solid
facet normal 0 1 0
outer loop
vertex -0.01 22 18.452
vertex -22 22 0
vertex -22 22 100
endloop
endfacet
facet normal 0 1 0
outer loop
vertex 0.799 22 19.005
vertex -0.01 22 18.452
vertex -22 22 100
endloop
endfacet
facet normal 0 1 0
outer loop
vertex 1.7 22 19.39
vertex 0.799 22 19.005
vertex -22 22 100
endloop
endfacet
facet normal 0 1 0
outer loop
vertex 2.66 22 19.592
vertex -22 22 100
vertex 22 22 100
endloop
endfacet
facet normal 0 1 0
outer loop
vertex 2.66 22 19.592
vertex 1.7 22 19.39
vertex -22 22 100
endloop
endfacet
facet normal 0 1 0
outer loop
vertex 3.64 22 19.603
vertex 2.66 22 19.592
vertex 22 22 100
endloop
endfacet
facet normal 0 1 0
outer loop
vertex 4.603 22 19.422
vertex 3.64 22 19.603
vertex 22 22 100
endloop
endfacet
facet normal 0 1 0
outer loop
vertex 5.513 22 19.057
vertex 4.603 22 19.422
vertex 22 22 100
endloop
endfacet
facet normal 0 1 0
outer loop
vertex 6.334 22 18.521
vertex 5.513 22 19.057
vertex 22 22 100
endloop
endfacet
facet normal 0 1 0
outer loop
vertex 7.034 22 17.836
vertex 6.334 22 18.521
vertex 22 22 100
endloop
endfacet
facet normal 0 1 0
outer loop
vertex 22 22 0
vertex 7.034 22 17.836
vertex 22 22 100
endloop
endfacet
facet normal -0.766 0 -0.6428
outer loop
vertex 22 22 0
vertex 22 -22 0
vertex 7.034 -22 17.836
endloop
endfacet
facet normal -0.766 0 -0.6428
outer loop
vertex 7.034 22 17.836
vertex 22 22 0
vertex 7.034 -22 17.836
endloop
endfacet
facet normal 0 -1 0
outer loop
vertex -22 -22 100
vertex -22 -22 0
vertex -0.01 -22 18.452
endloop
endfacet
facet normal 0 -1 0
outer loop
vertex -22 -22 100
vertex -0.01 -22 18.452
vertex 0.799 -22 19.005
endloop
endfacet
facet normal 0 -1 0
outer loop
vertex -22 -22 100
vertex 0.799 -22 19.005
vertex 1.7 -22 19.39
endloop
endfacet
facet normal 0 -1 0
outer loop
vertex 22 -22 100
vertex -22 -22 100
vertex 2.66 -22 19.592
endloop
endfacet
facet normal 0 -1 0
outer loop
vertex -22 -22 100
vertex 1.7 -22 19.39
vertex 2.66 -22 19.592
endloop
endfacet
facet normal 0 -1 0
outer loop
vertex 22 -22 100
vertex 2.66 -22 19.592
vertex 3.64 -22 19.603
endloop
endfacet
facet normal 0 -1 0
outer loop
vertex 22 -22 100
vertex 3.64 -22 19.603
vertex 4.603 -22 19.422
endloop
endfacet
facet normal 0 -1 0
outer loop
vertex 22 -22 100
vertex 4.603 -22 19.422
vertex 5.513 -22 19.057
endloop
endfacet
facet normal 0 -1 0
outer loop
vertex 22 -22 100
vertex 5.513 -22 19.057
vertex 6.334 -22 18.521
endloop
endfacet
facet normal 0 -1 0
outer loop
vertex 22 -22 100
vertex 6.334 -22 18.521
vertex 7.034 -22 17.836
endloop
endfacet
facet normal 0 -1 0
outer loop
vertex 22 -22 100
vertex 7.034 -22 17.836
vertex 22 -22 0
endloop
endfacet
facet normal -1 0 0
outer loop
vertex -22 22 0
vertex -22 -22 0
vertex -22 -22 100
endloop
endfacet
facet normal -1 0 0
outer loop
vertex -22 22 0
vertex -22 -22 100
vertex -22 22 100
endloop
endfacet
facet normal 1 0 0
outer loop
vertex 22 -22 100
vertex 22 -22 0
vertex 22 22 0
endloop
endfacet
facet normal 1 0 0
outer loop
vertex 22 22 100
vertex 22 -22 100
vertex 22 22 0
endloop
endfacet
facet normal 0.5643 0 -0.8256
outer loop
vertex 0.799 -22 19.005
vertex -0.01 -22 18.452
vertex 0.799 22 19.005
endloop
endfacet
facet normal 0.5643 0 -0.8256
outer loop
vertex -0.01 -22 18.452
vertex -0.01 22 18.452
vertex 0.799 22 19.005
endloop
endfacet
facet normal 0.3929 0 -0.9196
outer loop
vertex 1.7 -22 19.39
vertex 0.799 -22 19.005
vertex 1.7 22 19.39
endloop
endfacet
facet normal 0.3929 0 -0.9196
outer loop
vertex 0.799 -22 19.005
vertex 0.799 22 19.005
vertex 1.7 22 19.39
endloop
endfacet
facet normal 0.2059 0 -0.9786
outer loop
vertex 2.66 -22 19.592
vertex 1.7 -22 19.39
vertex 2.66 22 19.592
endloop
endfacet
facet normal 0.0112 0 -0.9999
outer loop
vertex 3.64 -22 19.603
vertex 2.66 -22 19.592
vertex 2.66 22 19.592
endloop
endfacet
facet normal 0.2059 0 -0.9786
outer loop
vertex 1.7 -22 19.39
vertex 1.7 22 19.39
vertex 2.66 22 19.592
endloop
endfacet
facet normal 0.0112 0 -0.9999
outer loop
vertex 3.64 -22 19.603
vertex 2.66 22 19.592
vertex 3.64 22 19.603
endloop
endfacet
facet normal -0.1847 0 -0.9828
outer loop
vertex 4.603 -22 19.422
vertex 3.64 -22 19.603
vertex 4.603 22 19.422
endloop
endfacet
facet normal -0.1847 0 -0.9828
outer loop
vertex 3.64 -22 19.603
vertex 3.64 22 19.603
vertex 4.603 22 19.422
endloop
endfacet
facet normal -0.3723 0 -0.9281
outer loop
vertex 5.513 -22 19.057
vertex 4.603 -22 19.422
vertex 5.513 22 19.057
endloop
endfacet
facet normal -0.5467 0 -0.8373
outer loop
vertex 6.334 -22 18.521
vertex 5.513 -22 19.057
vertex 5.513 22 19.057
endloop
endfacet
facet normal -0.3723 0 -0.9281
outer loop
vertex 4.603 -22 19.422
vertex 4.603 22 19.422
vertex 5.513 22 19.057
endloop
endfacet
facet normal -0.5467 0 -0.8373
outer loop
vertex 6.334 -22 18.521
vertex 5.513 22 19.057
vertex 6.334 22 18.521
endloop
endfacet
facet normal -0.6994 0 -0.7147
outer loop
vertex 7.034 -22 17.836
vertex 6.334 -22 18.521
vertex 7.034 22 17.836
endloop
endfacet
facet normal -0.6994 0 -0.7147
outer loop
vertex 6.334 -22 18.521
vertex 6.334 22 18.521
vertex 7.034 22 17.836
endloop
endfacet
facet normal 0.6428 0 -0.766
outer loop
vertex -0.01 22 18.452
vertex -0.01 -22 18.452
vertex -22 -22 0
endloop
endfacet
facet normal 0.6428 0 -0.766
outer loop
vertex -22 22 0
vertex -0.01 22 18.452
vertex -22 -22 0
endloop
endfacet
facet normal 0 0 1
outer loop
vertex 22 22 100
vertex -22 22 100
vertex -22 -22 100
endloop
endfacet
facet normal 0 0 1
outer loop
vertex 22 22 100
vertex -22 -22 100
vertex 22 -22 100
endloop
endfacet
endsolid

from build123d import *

# Parameters (mm, degrees)
F0_W     = 44
F0_H     = 44
F1_DEPTH = 100
F3_DEPTH = 44.001
F4_R     = 5


with BuildPart() as f1:
    # F0 (on Top) → F1 (new body)
    with BuildSketch(Plane.XY):
        Rectangle(F0_W, F0_H)
    extrude(amount=F1_DEPTH)

    # F2 (on face) → F3 (cut, through all)
    with BuildSketch(Plane.XZ.offset(22)):
        Polygon((3.82026, 21.665771), (-22, 0), (22, 0), align=None)
    extrude(amount=-F3_DEPTH, mode=Mode.SUBTRACT)

    # F4
    f4_edges = [f1.edges().sort_by_distance(p)[0] for p in [
        (3.82026, 0, 21.665771),
    ]]
    fillet(f4_edges, radius=F4_R)


solid = f1.part
